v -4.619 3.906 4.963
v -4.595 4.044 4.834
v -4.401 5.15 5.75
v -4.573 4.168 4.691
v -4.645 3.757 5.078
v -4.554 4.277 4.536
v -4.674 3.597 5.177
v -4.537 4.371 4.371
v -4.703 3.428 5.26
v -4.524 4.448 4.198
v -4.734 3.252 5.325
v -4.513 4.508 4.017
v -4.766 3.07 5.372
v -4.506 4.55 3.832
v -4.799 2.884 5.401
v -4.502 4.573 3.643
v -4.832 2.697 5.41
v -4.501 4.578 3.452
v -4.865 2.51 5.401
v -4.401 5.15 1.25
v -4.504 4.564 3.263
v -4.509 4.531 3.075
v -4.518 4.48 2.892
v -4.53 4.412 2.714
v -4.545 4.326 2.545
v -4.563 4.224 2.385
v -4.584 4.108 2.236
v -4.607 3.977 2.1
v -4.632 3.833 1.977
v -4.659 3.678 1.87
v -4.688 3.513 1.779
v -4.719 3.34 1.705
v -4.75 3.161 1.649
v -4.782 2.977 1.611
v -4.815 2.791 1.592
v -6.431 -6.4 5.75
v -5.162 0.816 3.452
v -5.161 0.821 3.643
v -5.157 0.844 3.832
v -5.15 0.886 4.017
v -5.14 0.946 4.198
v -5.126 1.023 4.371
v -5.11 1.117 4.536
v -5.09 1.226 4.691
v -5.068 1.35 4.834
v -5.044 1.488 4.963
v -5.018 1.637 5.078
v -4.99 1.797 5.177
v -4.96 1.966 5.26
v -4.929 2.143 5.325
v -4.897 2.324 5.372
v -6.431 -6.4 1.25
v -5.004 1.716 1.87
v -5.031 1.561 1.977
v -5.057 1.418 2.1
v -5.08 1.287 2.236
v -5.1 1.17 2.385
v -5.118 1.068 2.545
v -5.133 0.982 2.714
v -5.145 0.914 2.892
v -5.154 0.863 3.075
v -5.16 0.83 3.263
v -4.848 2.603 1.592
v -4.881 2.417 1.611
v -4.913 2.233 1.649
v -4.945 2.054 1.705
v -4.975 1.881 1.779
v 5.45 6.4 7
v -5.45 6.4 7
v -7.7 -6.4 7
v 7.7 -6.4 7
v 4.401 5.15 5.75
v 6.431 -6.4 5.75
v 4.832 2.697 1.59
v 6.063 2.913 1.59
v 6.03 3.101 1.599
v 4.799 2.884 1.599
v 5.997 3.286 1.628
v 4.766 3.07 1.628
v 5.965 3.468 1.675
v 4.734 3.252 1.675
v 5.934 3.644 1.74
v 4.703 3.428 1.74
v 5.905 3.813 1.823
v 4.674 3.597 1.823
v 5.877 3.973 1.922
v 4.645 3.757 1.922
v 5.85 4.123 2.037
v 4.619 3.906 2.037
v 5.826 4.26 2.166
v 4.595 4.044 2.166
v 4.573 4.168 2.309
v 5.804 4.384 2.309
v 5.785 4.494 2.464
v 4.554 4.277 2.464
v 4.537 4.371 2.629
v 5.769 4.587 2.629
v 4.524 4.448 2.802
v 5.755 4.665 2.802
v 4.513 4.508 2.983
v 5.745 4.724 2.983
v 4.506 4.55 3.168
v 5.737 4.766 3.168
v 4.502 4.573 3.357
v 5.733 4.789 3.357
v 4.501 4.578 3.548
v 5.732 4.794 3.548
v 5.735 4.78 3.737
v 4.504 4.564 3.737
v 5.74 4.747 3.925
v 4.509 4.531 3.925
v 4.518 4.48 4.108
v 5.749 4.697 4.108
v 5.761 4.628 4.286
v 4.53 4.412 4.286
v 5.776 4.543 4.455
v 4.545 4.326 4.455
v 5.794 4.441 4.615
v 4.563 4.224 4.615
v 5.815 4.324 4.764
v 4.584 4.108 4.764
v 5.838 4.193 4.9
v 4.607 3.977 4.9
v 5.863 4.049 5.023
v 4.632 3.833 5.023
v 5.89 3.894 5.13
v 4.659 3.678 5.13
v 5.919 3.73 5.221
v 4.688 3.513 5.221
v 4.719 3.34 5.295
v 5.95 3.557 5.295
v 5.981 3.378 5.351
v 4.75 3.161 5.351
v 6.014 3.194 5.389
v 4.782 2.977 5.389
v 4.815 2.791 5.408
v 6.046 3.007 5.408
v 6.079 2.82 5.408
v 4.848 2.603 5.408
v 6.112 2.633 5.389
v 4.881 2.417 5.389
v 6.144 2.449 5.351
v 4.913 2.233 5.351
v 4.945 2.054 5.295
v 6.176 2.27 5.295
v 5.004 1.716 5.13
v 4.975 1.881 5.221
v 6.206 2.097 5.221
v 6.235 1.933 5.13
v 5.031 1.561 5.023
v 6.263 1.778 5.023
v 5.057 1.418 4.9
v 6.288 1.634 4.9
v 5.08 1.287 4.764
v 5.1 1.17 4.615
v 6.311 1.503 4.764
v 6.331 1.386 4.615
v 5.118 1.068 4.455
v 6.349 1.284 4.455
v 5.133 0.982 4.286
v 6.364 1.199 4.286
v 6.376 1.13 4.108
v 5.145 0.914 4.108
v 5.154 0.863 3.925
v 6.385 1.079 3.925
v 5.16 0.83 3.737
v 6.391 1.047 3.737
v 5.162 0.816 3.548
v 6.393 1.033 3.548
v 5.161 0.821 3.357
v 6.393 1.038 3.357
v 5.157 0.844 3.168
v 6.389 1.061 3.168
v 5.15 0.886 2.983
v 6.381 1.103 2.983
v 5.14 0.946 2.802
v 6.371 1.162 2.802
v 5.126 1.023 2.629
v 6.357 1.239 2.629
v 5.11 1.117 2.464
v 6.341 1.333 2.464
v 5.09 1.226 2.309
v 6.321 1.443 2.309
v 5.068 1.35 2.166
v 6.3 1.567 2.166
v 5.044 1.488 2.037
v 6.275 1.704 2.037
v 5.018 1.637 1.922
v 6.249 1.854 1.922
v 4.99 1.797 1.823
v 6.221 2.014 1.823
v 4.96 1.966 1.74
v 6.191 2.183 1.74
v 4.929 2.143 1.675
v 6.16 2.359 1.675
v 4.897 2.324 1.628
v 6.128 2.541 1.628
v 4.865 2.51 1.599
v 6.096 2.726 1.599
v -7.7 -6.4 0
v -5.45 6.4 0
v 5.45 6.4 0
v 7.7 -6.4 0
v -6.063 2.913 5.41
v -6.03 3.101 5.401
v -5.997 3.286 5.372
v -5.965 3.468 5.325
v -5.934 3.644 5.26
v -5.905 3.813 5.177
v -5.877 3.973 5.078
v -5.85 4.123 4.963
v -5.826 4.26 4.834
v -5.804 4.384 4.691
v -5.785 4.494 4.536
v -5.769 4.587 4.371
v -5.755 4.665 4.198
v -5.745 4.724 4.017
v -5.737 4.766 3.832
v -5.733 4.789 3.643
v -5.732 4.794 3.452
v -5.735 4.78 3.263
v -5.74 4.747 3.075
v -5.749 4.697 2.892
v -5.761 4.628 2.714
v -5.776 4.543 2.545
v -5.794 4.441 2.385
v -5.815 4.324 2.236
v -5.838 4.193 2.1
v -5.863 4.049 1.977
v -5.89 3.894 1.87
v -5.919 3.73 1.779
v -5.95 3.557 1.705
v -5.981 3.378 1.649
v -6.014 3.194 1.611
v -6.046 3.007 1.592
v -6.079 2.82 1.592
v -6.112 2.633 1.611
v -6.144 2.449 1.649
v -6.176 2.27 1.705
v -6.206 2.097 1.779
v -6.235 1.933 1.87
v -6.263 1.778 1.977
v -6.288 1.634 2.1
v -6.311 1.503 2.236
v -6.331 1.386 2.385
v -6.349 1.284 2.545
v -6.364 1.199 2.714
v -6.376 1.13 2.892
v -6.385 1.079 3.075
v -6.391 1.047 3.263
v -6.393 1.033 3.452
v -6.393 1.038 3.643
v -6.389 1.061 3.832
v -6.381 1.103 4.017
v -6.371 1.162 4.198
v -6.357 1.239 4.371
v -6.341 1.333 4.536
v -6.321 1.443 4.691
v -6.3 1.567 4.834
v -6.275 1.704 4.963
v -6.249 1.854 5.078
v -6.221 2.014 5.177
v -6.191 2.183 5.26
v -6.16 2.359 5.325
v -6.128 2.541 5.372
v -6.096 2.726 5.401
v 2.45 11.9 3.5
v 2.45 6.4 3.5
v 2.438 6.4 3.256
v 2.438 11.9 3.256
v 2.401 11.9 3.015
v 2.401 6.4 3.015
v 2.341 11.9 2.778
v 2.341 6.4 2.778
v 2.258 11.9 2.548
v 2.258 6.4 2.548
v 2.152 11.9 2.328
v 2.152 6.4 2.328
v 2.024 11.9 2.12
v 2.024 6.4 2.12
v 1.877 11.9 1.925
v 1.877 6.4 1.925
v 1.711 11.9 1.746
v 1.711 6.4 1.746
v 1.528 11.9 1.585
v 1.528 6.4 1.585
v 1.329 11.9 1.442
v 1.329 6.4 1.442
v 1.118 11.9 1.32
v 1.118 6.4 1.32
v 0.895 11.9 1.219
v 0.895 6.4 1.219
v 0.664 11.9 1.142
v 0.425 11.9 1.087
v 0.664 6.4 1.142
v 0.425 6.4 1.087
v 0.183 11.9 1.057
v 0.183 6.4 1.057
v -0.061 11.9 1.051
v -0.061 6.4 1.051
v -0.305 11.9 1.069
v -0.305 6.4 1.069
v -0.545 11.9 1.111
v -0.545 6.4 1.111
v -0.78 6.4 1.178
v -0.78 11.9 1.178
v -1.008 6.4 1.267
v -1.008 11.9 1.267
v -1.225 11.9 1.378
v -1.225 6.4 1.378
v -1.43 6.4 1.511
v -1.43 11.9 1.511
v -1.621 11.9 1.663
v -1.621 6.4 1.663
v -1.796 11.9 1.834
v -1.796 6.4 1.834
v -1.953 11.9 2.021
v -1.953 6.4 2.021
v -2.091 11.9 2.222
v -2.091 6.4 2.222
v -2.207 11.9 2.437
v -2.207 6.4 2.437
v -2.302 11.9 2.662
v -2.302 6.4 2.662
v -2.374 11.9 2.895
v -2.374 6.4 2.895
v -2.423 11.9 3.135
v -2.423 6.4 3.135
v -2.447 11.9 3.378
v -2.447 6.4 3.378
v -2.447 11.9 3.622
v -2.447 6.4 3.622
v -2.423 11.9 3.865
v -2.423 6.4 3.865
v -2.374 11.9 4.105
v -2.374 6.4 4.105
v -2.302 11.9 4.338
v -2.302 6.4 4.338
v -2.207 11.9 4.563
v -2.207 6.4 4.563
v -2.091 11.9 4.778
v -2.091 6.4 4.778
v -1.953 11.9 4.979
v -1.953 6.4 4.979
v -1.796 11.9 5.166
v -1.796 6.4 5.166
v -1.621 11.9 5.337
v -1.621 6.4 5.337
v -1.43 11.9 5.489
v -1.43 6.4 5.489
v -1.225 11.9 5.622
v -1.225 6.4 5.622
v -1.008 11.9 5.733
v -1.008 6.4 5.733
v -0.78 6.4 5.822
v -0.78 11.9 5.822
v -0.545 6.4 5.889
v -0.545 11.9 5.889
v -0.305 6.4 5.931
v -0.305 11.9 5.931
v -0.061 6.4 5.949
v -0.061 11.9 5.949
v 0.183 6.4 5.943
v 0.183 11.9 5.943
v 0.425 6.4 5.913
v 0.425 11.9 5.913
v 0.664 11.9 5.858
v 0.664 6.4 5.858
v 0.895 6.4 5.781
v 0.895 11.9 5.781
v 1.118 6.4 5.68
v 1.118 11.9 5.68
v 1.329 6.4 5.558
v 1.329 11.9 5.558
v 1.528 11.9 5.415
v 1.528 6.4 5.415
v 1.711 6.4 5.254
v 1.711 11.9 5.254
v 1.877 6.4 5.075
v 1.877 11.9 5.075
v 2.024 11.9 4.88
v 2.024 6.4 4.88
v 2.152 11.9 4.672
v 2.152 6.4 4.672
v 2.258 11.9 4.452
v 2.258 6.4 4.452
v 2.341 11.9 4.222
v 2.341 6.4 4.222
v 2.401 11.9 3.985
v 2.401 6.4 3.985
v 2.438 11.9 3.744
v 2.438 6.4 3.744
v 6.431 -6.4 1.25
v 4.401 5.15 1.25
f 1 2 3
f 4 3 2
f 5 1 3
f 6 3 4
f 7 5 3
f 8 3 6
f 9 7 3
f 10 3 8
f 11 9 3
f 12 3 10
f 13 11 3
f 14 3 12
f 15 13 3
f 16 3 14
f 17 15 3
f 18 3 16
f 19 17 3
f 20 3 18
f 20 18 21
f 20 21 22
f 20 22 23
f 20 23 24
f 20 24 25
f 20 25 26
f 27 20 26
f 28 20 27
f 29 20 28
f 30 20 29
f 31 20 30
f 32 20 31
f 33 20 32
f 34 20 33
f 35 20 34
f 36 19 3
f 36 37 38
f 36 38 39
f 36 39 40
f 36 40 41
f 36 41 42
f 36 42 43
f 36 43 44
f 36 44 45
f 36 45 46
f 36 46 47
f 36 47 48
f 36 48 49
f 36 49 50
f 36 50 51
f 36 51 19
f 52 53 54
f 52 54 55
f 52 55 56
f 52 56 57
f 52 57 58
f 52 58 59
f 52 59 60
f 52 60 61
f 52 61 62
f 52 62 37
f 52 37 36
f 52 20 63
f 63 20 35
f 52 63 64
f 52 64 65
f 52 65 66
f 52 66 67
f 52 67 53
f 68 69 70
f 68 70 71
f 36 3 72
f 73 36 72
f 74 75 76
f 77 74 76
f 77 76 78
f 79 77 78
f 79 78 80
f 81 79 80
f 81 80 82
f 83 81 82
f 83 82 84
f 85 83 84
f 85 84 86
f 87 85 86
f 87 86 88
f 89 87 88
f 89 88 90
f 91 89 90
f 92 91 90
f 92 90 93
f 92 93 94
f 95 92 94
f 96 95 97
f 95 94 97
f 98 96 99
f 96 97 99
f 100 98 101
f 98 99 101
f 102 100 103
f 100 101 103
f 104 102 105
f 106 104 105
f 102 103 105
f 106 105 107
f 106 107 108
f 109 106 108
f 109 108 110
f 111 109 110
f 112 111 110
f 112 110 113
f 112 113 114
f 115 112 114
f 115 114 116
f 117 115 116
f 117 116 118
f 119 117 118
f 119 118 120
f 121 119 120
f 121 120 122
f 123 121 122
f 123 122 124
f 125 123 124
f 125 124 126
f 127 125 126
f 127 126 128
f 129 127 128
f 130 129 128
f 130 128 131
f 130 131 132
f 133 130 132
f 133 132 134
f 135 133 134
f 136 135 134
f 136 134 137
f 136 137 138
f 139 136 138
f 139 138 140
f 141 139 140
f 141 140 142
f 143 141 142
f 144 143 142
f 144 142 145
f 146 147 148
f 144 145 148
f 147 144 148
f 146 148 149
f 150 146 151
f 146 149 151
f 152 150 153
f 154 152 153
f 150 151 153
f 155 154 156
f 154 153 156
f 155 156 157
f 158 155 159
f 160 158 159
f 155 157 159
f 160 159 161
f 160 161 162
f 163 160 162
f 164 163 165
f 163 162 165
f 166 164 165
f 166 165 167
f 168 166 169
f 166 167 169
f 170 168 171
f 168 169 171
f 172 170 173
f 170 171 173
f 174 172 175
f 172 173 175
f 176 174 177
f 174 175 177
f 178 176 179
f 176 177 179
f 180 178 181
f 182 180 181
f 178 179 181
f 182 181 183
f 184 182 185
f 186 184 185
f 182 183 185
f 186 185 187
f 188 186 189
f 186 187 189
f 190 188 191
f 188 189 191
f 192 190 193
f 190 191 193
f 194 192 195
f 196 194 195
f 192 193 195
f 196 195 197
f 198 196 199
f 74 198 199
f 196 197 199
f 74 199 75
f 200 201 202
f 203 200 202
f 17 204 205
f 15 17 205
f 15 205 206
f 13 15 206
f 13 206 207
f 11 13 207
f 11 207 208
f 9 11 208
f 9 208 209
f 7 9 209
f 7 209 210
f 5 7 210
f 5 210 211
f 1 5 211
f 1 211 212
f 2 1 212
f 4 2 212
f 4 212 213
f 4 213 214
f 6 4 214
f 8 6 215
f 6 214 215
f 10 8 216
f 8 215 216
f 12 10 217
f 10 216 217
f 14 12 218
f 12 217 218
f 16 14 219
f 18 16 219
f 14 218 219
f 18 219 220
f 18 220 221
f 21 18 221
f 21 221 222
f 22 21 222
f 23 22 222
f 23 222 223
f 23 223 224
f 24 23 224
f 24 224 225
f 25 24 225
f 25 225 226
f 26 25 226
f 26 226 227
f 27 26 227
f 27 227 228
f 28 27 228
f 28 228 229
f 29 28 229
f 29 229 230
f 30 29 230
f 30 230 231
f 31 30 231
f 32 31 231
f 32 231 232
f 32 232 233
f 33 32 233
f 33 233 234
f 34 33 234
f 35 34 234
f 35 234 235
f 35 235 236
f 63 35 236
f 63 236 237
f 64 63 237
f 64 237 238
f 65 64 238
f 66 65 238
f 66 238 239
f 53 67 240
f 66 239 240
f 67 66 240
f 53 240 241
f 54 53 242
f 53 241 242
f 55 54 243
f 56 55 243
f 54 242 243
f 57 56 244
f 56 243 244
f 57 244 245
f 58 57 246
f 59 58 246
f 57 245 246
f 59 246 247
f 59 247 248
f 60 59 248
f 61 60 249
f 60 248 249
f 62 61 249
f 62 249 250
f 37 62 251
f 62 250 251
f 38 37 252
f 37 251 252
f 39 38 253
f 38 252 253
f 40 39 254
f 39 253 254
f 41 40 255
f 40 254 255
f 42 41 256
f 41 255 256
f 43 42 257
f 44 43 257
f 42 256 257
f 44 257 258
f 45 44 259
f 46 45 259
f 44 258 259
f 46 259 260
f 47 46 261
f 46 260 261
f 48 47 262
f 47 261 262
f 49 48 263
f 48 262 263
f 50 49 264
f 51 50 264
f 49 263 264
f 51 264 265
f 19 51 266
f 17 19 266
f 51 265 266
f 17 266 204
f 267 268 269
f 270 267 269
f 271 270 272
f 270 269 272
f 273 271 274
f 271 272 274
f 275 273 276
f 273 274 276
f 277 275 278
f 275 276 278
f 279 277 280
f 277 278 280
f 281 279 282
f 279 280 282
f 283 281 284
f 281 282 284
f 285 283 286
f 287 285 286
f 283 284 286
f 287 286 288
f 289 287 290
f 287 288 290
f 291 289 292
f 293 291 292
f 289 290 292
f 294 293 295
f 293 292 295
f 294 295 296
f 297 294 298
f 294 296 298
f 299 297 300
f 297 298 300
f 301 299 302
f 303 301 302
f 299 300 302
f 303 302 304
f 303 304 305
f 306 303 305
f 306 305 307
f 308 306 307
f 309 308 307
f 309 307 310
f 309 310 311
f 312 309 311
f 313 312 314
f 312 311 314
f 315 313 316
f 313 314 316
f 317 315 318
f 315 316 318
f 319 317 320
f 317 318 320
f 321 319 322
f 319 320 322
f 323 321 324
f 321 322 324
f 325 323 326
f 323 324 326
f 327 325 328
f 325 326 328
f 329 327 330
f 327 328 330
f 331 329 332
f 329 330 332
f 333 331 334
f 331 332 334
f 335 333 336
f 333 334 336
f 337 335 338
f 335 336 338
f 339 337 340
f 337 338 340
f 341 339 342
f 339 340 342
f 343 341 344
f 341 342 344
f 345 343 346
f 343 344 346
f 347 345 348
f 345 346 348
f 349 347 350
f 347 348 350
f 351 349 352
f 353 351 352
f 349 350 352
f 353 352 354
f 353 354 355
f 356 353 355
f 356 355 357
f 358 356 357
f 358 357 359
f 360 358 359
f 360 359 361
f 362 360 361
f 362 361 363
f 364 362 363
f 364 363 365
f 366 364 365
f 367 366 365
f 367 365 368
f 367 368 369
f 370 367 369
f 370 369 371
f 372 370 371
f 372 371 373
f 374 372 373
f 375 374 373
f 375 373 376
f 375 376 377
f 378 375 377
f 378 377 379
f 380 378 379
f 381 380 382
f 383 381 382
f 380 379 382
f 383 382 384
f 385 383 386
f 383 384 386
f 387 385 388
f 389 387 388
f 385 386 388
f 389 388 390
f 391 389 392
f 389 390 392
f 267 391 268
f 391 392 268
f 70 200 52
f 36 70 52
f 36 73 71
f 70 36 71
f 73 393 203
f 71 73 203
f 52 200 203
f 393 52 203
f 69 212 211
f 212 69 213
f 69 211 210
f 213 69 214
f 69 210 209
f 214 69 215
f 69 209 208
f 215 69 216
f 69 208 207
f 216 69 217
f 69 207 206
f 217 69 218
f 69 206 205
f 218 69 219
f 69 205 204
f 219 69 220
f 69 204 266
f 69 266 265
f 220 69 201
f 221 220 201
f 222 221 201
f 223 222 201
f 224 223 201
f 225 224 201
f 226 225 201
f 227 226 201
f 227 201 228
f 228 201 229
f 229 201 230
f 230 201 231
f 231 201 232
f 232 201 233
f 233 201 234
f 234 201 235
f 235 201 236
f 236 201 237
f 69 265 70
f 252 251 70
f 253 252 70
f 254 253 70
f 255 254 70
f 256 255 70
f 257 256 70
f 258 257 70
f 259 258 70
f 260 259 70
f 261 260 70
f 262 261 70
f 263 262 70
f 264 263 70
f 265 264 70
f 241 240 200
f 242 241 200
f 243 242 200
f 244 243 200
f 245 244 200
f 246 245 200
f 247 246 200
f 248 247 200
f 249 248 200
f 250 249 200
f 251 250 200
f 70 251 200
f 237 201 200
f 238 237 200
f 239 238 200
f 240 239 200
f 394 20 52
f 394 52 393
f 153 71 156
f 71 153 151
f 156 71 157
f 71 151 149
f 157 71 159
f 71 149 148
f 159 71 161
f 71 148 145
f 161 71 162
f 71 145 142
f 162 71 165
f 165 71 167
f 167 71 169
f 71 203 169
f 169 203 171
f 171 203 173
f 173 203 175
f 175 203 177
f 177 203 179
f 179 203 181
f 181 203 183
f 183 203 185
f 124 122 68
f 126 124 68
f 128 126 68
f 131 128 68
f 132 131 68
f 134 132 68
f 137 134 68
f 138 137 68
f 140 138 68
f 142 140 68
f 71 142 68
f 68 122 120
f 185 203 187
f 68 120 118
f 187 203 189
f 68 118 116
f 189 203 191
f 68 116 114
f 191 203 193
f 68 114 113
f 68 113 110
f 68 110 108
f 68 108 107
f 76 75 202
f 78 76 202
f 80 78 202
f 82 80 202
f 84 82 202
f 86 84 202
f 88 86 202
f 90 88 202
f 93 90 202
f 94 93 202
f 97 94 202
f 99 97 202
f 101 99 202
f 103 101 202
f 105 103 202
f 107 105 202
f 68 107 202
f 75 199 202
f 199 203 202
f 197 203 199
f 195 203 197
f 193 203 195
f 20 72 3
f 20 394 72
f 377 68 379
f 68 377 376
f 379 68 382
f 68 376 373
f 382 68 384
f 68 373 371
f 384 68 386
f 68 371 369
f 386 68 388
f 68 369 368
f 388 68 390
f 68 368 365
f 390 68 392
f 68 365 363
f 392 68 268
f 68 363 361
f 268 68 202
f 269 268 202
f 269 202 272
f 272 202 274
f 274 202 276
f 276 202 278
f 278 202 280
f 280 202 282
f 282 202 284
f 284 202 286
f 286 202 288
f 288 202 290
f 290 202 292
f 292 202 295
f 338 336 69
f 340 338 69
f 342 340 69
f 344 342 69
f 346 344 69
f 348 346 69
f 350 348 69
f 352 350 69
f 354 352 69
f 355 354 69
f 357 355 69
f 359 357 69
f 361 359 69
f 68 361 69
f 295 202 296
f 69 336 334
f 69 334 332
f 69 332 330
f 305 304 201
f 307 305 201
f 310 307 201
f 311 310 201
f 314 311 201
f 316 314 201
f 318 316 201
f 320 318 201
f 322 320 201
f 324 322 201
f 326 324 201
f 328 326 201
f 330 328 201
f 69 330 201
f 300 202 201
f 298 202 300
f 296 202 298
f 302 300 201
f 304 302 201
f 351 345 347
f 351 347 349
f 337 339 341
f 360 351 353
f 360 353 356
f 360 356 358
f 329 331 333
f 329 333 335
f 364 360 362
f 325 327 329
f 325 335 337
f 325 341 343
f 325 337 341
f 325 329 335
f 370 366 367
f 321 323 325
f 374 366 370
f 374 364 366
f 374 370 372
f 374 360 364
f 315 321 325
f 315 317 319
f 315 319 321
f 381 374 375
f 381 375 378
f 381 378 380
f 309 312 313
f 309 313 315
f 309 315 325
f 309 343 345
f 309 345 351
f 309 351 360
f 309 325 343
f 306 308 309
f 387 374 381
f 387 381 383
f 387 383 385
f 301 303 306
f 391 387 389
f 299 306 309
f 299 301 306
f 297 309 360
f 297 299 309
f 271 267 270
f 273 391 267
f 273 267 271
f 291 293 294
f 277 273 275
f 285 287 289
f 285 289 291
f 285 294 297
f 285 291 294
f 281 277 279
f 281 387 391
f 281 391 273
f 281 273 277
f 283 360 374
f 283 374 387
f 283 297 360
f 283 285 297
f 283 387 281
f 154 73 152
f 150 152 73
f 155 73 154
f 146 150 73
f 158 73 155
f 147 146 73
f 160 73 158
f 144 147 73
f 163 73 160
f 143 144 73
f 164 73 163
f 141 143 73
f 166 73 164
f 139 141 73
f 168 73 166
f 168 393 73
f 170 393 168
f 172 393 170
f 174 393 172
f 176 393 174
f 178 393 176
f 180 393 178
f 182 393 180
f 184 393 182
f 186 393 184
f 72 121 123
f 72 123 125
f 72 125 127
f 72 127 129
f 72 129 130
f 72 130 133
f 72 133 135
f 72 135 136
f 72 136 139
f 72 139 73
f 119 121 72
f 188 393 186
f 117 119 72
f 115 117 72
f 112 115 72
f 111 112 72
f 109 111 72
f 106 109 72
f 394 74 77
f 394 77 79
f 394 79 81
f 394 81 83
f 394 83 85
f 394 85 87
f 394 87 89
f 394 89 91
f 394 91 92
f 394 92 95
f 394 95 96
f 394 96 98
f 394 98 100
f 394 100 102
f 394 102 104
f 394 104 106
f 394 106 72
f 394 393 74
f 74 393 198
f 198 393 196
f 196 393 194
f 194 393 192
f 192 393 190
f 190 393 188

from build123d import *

# Parameters (mm, degrees)
EXTRUDE1_DEPTH = 7
SHELL1_T       = -1.25
SKETCH2_R      = 2.45
EXTRUDE2_DEPTH = 5.5
EXTRUDE3_REACH = 17.167
SKETCH3_R      = 1.91
EXTRUDE4_REACH = 17.167
SKETCH4_R      = 1.91


with BuildPart() as part:
    # Sketch1 → Extrude1 (new body)
    with BuildSketch(Plane.XY):
        Polygon((-5.45, 6.4), (-7.7, -6.4), (7.7, -6.4), (5.45, 6.4), align=None)
    extrude(amount=EXTRUDE1_DEPTH)

    # Shell1
    shell1_openings = [part.faces().sort_by_distance(p)[0] for p in [
        (0, -6.4, 3.5),
    ]]
    offset(amount=SHELL1_T, openings=shell1_openings, kind=Kind.INTERSECTION)

    # Sketch2 → Extrude2 (add)
    with BuildSketch(Plane(origin=(0, 6.4, 0), x_dir=(1, 0, 0), z_dir=(0, 1, 0))):
        with Locations((0, -3.5)):
            Circle(SKETCH2_R)
    extrude(amount=EXTRUDE2_DEPTH)

    # Sketch3 → Extrude3 (cut, up to next)
    with BuildSketch(Plane(origin=(-6.377928095, 1.121120173, 0), x_dir=(0, 0, 1), z_dir=(-0.984899531, 0.173126871, 0)), mode=Mode.PRIVATE) as extrude3_sk1:
        with Locations((3.5, 1.819815554)):
            Circle(SKETCH3_R)
    extrude3_tool1 = extrude(extrude3_sk1.sketch, amount=-EXTRUDE3_REACH, mode=Mode.PRIVATE) & part.part
    add(extrude3_tool1.solids().sort_by_distance((-6.062869, 2.913456, 3.5))[0], mode=Mode.SUBTRACT)

    # Sketch4 → Extrude4 (cut, up to next)
    with BuildSketch(Plane(origin=(6.377928095, 1.121120173, 0), x_dir=(0, 0, -1), z_dir=(0.984899531, 0.173126871, 0)), mode=Mode.PRIVATE) as extrude4_sk1:
        with Locations((-3.5, 1.819815554)):
            Circle(SKETCH4_R)
    extrude4_tool1 = extrude(extrude4_sk1.sketch, amount=-EXTRUDE4_REACH, mode=Mode.PRIVATE) & part.part
    add(extrude4_tool1.solids().sort_by_distance((6.062869, 2.913456, 3.5))[0], mode=Mode.SUBTRACT)


solid = part.part
